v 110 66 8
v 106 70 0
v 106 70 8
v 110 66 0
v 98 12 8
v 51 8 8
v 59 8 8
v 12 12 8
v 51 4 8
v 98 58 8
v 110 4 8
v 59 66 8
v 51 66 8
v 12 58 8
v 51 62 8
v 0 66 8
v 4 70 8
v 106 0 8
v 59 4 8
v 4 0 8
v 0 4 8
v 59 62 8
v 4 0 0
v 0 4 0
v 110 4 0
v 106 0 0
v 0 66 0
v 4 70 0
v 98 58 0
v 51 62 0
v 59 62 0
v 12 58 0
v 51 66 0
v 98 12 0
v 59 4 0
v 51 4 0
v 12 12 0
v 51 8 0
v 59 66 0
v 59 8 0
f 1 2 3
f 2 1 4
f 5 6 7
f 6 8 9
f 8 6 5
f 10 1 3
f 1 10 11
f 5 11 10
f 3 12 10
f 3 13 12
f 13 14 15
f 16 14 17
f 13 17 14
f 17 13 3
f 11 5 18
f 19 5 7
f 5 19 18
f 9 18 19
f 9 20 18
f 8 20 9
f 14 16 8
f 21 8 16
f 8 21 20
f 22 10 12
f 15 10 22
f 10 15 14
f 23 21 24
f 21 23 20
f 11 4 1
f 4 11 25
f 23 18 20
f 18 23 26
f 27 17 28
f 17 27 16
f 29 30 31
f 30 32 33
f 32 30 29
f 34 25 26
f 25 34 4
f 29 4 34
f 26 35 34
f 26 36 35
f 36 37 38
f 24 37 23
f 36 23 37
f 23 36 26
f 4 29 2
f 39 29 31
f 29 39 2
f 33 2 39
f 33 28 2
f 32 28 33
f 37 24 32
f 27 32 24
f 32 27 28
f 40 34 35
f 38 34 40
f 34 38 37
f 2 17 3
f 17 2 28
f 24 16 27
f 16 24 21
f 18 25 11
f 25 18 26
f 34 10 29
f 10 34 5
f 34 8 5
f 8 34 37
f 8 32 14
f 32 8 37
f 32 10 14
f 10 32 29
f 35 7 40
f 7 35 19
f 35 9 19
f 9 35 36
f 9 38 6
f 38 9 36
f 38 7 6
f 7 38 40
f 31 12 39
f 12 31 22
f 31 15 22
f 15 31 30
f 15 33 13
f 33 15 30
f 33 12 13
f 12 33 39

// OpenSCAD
$fn = 32;

// ----------------------------------------------------------------------
// Frame plate: 110 x 70 frame, 12 mm rails
// ----------------------------------------------------------------------

// --- parameters (mm) ---
plate_l = 110;            // plate length, X
plate_w = 70;             // plate width, Y
plate_t = 8;              // plate thickness, Z (extrusion height)
corner_c = 4;             // corner chamfer
frame_bar = 12;           // frame rail width
slot_l = 8;               // adjustment slot length
slot_w = 4;               // adjustment slot width
fit_tol = 0.1;            // declared fit tolerance (prompt contract)
free_tol = 0.5;           // declared free tolerance (prompt contract)

win_l = plate_l - 2 * frame_bar;  // window length
win_w = plate_w - 2 * frame_bar;  // window width

profile = [[4, 0], [106, 0], [110, 4], [110, 66], [106, 70], [4, 70], [0, 66], [0, 4]];  // primary outline, 8 points, counter clockwise
void_1 = [[12, 12], [98, 12], [98, 58], [12, 58]];  // the window, 4 points
void_2 = [[51, 4], [59, 4], [59, 8], [51, 8]];  // adjustment slot, 4 points
void_3 = [[51, 62], [59, 62], [59, 66], [51, 66]];  // adjustment slot, 4 points

// --- the one profile operation ---
difference() {
  linear_extrude(height = plate_t) polygon(points = profile);
  translate([0, 0, -1])
    linear_extrude(height = plate_t + 2) polygon(points = void_1);
  translate([0, 0, -1])
    linear_extrude(height = plate_t + 2) polygon(points = void_2);
  translate([0, 0, -1])
    linear_extrude(height = plate_t + 2) polygon(points = void_3);
}
